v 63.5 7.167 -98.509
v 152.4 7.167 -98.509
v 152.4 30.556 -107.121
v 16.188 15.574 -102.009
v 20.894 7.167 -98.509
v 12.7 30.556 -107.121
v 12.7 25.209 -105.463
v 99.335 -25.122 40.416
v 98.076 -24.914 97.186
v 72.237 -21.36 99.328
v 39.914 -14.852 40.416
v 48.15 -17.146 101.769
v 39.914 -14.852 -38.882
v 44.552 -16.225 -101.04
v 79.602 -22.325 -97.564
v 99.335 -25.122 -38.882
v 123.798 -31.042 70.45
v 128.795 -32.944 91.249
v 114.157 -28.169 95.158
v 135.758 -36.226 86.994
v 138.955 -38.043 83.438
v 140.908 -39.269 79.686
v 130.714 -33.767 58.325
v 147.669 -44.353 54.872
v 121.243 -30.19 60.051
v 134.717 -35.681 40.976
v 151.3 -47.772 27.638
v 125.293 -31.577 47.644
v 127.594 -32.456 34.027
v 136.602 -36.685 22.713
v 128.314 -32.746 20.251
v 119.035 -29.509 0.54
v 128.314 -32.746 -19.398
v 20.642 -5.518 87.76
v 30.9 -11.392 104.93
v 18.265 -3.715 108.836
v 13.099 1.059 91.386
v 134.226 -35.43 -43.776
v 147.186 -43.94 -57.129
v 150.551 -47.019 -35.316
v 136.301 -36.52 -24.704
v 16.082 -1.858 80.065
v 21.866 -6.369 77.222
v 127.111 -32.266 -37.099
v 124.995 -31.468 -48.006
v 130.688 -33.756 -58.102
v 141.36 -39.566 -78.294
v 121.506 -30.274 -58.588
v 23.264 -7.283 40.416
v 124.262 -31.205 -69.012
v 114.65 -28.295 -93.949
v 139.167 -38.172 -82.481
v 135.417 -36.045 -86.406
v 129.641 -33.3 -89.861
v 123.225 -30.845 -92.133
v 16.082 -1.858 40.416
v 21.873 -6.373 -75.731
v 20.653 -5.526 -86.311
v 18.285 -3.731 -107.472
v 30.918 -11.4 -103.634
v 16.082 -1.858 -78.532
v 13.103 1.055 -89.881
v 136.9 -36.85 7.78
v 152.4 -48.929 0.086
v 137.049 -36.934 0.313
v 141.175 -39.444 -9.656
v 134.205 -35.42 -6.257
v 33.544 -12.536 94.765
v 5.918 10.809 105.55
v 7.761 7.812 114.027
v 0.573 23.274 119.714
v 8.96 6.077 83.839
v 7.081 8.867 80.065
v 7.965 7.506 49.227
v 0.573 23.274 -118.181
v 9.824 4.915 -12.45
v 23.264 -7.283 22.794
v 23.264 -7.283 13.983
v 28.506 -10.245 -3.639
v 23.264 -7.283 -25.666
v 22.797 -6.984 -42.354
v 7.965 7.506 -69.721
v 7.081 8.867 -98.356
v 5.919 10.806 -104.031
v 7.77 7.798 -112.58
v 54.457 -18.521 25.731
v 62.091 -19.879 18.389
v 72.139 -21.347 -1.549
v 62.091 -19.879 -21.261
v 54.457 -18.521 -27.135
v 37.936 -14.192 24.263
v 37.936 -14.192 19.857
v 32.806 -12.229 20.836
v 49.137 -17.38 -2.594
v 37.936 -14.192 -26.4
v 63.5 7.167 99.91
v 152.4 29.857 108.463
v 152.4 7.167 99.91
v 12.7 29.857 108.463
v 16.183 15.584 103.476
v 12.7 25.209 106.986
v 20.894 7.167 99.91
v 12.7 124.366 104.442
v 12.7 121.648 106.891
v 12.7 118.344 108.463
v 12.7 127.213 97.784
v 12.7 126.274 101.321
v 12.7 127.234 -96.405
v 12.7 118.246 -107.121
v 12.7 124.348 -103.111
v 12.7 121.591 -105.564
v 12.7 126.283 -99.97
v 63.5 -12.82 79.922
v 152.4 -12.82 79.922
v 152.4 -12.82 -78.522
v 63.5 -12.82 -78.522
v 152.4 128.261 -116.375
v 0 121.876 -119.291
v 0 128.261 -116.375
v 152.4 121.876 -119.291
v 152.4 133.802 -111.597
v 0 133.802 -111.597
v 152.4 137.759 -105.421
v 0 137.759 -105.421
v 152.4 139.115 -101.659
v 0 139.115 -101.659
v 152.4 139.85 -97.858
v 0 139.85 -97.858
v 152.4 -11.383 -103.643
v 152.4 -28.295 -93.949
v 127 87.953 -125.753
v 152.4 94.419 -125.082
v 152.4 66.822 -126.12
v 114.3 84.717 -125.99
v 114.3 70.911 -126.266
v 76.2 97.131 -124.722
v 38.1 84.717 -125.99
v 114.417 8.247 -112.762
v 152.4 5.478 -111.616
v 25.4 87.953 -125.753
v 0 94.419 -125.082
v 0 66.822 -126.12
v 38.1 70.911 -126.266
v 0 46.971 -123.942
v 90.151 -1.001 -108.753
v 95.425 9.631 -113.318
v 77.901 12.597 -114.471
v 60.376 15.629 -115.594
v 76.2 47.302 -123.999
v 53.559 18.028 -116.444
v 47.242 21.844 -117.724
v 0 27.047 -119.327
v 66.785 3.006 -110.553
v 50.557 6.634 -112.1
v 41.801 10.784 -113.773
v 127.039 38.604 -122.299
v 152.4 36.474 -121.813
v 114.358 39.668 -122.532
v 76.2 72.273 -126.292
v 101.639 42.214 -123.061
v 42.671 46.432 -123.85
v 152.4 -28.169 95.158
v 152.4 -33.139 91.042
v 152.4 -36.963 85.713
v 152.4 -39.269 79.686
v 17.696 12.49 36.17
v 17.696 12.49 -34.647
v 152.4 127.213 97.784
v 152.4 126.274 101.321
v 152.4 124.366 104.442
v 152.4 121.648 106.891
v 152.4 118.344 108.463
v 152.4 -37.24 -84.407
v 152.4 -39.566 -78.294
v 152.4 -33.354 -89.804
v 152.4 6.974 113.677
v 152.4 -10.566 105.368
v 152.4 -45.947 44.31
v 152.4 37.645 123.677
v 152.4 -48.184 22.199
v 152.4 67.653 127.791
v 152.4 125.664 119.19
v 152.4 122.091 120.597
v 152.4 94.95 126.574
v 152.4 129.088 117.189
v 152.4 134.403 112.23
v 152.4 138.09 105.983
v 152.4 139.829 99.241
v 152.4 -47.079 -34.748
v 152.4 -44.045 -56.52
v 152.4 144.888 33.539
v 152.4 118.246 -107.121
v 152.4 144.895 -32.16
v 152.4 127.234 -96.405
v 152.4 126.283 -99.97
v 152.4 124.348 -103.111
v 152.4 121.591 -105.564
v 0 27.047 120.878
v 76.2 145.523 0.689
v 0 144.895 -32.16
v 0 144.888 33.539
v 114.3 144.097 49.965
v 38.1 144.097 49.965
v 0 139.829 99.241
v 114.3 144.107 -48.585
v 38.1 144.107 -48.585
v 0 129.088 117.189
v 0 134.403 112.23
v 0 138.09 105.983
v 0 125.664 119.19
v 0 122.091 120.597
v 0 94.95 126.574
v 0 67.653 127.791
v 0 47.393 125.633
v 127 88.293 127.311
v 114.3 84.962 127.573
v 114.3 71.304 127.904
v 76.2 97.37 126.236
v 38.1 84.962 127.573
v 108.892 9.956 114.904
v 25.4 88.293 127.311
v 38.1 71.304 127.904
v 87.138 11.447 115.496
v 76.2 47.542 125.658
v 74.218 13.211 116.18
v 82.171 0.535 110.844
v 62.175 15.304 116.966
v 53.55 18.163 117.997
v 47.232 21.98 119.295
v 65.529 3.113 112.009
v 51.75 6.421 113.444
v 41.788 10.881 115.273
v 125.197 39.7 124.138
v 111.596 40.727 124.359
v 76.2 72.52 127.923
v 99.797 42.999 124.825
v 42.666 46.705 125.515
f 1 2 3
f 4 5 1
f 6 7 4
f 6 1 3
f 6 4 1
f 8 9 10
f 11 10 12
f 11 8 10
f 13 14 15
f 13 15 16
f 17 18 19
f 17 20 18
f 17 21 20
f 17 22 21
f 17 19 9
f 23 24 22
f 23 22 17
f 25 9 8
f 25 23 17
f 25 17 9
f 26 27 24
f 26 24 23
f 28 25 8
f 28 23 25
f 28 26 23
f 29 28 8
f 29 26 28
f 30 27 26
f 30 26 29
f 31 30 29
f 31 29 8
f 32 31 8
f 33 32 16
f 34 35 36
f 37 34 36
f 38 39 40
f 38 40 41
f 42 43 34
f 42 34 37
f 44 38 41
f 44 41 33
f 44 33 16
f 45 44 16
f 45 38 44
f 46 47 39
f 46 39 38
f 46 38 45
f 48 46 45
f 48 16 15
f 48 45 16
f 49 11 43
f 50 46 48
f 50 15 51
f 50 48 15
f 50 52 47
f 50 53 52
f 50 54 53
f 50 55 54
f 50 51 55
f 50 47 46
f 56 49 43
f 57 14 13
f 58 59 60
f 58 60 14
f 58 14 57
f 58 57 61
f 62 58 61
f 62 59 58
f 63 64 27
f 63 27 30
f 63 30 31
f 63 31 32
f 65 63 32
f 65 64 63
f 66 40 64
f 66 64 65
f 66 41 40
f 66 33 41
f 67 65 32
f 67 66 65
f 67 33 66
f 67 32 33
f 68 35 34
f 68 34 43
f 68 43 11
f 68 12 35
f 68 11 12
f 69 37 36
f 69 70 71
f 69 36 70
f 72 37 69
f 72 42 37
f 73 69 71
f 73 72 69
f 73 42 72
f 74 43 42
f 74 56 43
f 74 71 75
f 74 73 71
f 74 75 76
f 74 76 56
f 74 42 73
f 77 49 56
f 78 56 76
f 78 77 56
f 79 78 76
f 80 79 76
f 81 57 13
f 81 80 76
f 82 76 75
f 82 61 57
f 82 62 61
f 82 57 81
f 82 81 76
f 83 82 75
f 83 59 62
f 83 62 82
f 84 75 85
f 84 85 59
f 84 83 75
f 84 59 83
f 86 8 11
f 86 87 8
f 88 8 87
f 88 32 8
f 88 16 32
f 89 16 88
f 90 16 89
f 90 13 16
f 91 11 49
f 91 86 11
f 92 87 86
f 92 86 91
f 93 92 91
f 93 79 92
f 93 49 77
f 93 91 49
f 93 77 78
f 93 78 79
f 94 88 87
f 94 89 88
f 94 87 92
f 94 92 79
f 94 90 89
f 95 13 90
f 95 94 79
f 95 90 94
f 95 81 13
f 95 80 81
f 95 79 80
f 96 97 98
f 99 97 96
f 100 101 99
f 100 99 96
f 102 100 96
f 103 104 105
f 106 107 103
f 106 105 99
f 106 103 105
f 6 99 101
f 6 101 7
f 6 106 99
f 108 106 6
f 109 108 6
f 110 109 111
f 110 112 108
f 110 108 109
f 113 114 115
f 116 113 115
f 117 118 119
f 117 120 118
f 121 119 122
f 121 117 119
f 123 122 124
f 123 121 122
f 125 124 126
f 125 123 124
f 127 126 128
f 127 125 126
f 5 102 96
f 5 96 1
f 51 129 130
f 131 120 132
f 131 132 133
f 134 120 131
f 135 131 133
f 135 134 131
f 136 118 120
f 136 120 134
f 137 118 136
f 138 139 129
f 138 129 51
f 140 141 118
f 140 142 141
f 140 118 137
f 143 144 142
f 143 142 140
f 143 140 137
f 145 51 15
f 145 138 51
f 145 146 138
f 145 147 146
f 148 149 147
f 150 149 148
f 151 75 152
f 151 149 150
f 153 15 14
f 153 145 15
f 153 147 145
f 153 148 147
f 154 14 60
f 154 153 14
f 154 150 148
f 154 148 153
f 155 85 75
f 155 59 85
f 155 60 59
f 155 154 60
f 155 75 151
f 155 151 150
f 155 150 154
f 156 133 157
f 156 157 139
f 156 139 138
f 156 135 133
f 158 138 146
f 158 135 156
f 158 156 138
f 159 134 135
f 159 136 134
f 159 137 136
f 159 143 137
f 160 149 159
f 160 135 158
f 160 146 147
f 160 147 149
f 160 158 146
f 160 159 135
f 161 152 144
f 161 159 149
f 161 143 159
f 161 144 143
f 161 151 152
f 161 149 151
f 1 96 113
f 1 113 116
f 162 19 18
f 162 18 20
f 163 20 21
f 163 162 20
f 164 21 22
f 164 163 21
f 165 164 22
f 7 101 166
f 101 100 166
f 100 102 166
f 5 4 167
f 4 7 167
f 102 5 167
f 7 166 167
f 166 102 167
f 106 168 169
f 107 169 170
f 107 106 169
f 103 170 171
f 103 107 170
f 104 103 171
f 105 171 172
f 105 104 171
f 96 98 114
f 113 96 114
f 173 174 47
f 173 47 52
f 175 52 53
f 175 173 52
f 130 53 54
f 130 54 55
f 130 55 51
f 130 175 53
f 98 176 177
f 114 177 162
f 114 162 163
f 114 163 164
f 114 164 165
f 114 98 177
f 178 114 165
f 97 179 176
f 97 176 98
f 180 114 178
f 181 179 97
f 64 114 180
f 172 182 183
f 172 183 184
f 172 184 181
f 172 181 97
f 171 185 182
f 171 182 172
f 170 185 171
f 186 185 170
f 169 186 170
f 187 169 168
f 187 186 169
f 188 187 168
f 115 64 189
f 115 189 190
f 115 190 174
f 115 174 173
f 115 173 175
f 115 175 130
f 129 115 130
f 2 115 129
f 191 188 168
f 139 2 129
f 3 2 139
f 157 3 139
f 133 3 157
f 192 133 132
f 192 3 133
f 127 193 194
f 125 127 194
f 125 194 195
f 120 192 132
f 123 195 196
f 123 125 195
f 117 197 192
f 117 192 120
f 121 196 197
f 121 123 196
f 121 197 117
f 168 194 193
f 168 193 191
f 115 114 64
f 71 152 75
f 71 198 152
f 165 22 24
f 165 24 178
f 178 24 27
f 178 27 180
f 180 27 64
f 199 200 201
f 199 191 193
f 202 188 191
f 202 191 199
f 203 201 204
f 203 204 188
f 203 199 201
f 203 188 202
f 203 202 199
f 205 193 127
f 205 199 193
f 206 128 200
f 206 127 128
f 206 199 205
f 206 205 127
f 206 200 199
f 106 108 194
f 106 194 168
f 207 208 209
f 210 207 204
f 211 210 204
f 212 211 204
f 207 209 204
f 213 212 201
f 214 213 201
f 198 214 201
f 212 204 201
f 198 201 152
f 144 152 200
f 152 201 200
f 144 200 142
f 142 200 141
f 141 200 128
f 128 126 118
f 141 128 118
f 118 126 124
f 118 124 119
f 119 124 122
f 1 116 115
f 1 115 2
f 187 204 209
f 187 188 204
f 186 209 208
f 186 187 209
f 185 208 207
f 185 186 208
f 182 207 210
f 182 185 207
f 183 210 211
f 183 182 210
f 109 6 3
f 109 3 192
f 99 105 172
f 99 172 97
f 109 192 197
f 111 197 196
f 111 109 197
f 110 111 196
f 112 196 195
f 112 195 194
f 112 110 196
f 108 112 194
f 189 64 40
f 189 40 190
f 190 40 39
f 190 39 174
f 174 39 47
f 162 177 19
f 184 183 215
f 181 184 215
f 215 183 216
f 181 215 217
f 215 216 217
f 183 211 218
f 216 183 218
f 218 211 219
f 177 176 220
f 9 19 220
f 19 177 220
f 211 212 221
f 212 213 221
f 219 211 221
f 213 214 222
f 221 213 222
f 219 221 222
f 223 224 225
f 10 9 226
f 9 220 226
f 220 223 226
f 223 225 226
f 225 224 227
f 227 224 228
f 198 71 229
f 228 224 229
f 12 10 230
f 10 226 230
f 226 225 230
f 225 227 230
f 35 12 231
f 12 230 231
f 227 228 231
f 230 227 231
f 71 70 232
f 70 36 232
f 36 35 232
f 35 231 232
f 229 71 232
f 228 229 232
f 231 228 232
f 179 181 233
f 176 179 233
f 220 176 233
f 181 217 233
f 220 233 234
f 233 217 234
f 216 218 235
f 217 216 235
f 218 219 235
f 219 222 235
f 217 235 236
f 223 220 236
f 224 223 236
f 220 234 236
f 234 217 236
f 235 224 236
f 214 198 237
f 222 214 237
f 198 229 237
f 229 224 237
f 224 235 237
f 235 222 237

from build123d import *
from OCP.BRepAlgoAPI import BRepAlgoAPI_Cut
from OCP.TopTools import TopTools_ListOfShape

# Parameters (mm, degrees)
BOSS_EXTRUDE8_DEPTH      = 152.4
FILLET4_R                = 25.4
FILLET5_R                = 25.4
FILLET6_R                = 25.4
FILLET7_R                = 25.4
CUT_EXTRUDE16_DEPTH      = 247.514886375
CUT_EXTRUDE16_DEPTH_BACK = 247.514886375
SKETCH15_OUTSIDE_W       = 225.302
SKETCH15_OUTSIDE_H       = 267.354
CUT_EXTRUDE15_START      = -139.7
CUT_EXTRUDE15_DEPTH      = 139.7
CUT_EXTRUDE15_START_2    = -107.121047974
CUT_EXTRUDE15_2_DEPTH    = 215.583659042
FILLET10_R               = 12.7
CUT_EXTRUDE17_DEPTH      = 88.9


with BuildPart() as part:
    # Sketch8 → Boss-Extrude8 (new body)
    with BuildSketch(Plane(origin=(0, 0, 0), x_dir=(0, 0, -1), z_dir=(1, 0, 0))):
        with BuildLine():
            add(Edge.make_bspline(
                [(-89.517321988, -36.735442624), (-0.634104952, -60.975176902), (88.282437318, -37.028001665)],
                knots=[0, 0, 0, 1, 1, 1], degree=2))
            add(Edge.make_bspline(
                [(113.698608464, 137.87777005), (148.206005145, 51.814722278), (88.282437318, -37.028001665)],
                knots=[0, 0, 0, 1, 1, 1], degree=2))
            add(Edge.make_bspline(
                [(-114.901391536, 137.87777005), (-0.596034429, 153.168104446), (113.698608464, 137.87777005)],
                knots=[0, 0, 0, 1, 1, 1], degree=2))
            add(Edge.make_bspline(
                [(-114.901391536, 137.87777005), (-150.307927624, 52.141383045), (-89.517321988, -36.735442624)],
                knots=[0, 0, 0, 1, 1, 1], degree=2))
        make_face()
    extrude(amount=BOSS_EXTRUDE8_DEPTH)

    # Fillet4
    fillet4_edges = [part.edges().sort_by_distance(p)[0] for p in [
        (76.2, 137.87777005, 114.901391536),
    ]]
    fillet(fillet4_edges, radius=FILLET4_R)

    # Fillet5
    fillet5_edges = [part.edges().sort_by_distance(p)[0] for p in [
        (76.2, -36.735442624, 89.517321988),
    ]]
    fillet(fillet5_edges, radius=FILLET5_R)

    # Fillet6
    fillet6_edges = [part.edges().sort_by_distance(p)[0] for p in [
        (76.2, -37.028001665, -88.282437318),
    ]]
    fillet(fillet6_edges, radius=FILLET6_R)

    # Fillet7
    fillet7_edges = [part.edges().sort_by_distance(p)[0] for p in [
        (76.2, 137.87777005, -113.698608464),
    ]]
    fillet(fillet7_edges, radius=FILLET7_R)


with BuildPart() as cut_extrude16_tool:
    # Sketch15 outside → Cut-Extrude16 (new, two sides: drawn at the far end of the back side and taken through both)
    with BuildSketch(Plane.XY.offset(-CUT_EXTRUDE16_DEPTH_BACK)):
        with Locations((76.2, 48.297)):
            Rectangle(SKETCH15_OUTSIDE_W, SKETCH15_OUTSIDE_H)
        with BuildLine():
            Line((0, 145.522937248), (152.4, 145.522937248))
            Line((152.4, 145.522937248), (152.4, -48.92889358))
            add(Edge.make_bspline(
                [(152.4, -48.92889358), (110.926936948, -4.126097701), (19.317462744, -43.320532891), (0, 25.209390068)],
                knots=[0, 0, 0, 0, 1, 1, 1, 1], degree=3))
            Line((0, 25.209390068), (0, 145.522937248))
        make_face(mode=Mode.SUBTRACT)
    extrude(amount=CUT_EXTRUDE16_DEPTH + CUT_EXTRUDE16_DEPTH_BACK)


with BuildPart() as part_1:
    add(part.part)

    # Cut-Extrude16: cut by cut_extrude16_tool, with a tolerance
    cut_extrude16_stock = TopTools_ListOfShape()
    cut_extrude16_stock.Append(part_1.part.wrapped)
    cut_extrude16_tools = TopTools_ListOfShape()
    cut_extrude16_tools.Append(cut_extrude16_tool.part.wrapped)
    cut_extrude16_cut = BRepAlgoAPI_Cut()
    cut_extrude16_cut.SetArguments(cut_extrude16_stock)
    cut_extrude16_cut.SetTools(cut_extrude16_tools)
    cut_extrude16_cut.SetFuzzyValue(0.00001)
    cut_extrude16_cut.Build()
    add(Compound.cast(cut_extrude16_cut.Shape()).solids(), mode=Mode.REPLACE)

    # Cut-Extrude15: read off the stored shape, not the designer's step
    # Cut-Extrude15 outline → Cut-Extrude15 (cut)
    with BuildSketch(Plane(origin=(152.4, 0, 0), x_dir=(0, 0, -1), z_dir=(1, 0, 0)).offset(CUT_EXTRUDE15_START)):
        with BuildLine():
            Line((-108.462610918, 118.343948744), (-108.462610968, 29.857145502))
            add(Edge.make_bspline(
                [(-108.462610968, 29.857145502), (-108.303396792, 29.330392086), (-108.141581561, 28.80417359), (-107.065329269, 25.362622105), (-106.073914967, 22.462725385), (-103.939463928, 16.695703636), (-102.803256247, 13.846836756), (-101.052061435, 9.735706989), (-100.487342065, 8.448198791), (-99.909630865, 7.167215308)],
                knots=[0.613732154, 0.613732154, 0.613732154, 0.613732154, 0.625, 0.625, 0.6875, 0.6875, 0.75, 0.75, 0.77871627, 0.77871627, 0.77871627, 0.77871627], degree=3))
            Line((-99.909630865, 7.167215308), (98.50890353, 7.1672153))
            add(Edge.make_bspline(
                [(98.50890353, 7.1672153), (99.030702422, 8.344757297), (99.541287229, 9.526823546), (102.383358501, 16.284548345), (104.473090717, 21.957741134), (106.563539536, 28.680710786), (106.846143617, 29.616761908), (107.121047874, 30.555919476)],
                knots=[0.223373266, 0.223373266, 0.223373266, 0.223373266, 0.25, 0.25, 0.375, 0.375, 0.395143119, 0.395143119, 0.395143119, 0.395143119], degree=3))
            Line((107.121047874, 30.555919476), (107.121047874, 118.246293452))
            ThreePointArc((107.121047874, 118.246293452), (103.111414114, 124.347995452), (96.404571724, 127.233510198))
            Line((96.404571724, 127.233510198), (-97.784453574, 127.21292508))
            ThreePointArc((-97.784453574, 127.21292508), (-104.442431868, 124.366378649), (-108.462610918, 118.343948744))
        make_face()
    extrude(amount=CUT_EXTRUDE15_DEPTH, mode=Mode.SUBTRACT)

    # Cut-Extrude15 2 outline → Cut-Extrude15 2 (add)
    with BuildSketch(Plane.XY.offset(CUT_EXTRUDE15_START_2)):
        with BuildLine():
            Line((12.7, 7.167215307), (20.89442948, 7.1672153))
            add(Edge.make_bspline(
                [(20.89442948, 7.1672153), (17.477928889, 12.167382595), (14.701088569, 18.110401588), (12.7, 25.209390068)],
                knots=[0.896410383, 0.896410383, 0.896410383, 0.896410383, 1, 1, 1, 1], degree=3))
            Line((12.7, 25.209390068), (12.7, 7.167215307))
        make_face()
    extrude(amount=CUT_EXTRUDE15_2_DEPTH)

    # Fillet10
    fillet10_edges = [part_1.edges().sort_by_distance(p)[0] for p in [
        (0, 25.209390068, 60.161160898),
    ]]
    fillet(fillet10_edges, radius=FILLET10_R)

    # Sketch17 → Cut-Extrude17 (cut)
    with BuildSketch(Plane(origin=(152.4, 0, 0), x_dir=(0, 0, -1), z_dir=(1, 0, 0))):
        Polygon((-99.909630865, 7.167215308), (-79.922490142, -12.819925415), (78.521762811, -12.819925415), (98.508903533, 7.167215308), align=None)
    extrude(amount=-CUT_EXTRUDE17_DEPTH, mode=Mode.SUBTRACT)


solid = part_1.part
